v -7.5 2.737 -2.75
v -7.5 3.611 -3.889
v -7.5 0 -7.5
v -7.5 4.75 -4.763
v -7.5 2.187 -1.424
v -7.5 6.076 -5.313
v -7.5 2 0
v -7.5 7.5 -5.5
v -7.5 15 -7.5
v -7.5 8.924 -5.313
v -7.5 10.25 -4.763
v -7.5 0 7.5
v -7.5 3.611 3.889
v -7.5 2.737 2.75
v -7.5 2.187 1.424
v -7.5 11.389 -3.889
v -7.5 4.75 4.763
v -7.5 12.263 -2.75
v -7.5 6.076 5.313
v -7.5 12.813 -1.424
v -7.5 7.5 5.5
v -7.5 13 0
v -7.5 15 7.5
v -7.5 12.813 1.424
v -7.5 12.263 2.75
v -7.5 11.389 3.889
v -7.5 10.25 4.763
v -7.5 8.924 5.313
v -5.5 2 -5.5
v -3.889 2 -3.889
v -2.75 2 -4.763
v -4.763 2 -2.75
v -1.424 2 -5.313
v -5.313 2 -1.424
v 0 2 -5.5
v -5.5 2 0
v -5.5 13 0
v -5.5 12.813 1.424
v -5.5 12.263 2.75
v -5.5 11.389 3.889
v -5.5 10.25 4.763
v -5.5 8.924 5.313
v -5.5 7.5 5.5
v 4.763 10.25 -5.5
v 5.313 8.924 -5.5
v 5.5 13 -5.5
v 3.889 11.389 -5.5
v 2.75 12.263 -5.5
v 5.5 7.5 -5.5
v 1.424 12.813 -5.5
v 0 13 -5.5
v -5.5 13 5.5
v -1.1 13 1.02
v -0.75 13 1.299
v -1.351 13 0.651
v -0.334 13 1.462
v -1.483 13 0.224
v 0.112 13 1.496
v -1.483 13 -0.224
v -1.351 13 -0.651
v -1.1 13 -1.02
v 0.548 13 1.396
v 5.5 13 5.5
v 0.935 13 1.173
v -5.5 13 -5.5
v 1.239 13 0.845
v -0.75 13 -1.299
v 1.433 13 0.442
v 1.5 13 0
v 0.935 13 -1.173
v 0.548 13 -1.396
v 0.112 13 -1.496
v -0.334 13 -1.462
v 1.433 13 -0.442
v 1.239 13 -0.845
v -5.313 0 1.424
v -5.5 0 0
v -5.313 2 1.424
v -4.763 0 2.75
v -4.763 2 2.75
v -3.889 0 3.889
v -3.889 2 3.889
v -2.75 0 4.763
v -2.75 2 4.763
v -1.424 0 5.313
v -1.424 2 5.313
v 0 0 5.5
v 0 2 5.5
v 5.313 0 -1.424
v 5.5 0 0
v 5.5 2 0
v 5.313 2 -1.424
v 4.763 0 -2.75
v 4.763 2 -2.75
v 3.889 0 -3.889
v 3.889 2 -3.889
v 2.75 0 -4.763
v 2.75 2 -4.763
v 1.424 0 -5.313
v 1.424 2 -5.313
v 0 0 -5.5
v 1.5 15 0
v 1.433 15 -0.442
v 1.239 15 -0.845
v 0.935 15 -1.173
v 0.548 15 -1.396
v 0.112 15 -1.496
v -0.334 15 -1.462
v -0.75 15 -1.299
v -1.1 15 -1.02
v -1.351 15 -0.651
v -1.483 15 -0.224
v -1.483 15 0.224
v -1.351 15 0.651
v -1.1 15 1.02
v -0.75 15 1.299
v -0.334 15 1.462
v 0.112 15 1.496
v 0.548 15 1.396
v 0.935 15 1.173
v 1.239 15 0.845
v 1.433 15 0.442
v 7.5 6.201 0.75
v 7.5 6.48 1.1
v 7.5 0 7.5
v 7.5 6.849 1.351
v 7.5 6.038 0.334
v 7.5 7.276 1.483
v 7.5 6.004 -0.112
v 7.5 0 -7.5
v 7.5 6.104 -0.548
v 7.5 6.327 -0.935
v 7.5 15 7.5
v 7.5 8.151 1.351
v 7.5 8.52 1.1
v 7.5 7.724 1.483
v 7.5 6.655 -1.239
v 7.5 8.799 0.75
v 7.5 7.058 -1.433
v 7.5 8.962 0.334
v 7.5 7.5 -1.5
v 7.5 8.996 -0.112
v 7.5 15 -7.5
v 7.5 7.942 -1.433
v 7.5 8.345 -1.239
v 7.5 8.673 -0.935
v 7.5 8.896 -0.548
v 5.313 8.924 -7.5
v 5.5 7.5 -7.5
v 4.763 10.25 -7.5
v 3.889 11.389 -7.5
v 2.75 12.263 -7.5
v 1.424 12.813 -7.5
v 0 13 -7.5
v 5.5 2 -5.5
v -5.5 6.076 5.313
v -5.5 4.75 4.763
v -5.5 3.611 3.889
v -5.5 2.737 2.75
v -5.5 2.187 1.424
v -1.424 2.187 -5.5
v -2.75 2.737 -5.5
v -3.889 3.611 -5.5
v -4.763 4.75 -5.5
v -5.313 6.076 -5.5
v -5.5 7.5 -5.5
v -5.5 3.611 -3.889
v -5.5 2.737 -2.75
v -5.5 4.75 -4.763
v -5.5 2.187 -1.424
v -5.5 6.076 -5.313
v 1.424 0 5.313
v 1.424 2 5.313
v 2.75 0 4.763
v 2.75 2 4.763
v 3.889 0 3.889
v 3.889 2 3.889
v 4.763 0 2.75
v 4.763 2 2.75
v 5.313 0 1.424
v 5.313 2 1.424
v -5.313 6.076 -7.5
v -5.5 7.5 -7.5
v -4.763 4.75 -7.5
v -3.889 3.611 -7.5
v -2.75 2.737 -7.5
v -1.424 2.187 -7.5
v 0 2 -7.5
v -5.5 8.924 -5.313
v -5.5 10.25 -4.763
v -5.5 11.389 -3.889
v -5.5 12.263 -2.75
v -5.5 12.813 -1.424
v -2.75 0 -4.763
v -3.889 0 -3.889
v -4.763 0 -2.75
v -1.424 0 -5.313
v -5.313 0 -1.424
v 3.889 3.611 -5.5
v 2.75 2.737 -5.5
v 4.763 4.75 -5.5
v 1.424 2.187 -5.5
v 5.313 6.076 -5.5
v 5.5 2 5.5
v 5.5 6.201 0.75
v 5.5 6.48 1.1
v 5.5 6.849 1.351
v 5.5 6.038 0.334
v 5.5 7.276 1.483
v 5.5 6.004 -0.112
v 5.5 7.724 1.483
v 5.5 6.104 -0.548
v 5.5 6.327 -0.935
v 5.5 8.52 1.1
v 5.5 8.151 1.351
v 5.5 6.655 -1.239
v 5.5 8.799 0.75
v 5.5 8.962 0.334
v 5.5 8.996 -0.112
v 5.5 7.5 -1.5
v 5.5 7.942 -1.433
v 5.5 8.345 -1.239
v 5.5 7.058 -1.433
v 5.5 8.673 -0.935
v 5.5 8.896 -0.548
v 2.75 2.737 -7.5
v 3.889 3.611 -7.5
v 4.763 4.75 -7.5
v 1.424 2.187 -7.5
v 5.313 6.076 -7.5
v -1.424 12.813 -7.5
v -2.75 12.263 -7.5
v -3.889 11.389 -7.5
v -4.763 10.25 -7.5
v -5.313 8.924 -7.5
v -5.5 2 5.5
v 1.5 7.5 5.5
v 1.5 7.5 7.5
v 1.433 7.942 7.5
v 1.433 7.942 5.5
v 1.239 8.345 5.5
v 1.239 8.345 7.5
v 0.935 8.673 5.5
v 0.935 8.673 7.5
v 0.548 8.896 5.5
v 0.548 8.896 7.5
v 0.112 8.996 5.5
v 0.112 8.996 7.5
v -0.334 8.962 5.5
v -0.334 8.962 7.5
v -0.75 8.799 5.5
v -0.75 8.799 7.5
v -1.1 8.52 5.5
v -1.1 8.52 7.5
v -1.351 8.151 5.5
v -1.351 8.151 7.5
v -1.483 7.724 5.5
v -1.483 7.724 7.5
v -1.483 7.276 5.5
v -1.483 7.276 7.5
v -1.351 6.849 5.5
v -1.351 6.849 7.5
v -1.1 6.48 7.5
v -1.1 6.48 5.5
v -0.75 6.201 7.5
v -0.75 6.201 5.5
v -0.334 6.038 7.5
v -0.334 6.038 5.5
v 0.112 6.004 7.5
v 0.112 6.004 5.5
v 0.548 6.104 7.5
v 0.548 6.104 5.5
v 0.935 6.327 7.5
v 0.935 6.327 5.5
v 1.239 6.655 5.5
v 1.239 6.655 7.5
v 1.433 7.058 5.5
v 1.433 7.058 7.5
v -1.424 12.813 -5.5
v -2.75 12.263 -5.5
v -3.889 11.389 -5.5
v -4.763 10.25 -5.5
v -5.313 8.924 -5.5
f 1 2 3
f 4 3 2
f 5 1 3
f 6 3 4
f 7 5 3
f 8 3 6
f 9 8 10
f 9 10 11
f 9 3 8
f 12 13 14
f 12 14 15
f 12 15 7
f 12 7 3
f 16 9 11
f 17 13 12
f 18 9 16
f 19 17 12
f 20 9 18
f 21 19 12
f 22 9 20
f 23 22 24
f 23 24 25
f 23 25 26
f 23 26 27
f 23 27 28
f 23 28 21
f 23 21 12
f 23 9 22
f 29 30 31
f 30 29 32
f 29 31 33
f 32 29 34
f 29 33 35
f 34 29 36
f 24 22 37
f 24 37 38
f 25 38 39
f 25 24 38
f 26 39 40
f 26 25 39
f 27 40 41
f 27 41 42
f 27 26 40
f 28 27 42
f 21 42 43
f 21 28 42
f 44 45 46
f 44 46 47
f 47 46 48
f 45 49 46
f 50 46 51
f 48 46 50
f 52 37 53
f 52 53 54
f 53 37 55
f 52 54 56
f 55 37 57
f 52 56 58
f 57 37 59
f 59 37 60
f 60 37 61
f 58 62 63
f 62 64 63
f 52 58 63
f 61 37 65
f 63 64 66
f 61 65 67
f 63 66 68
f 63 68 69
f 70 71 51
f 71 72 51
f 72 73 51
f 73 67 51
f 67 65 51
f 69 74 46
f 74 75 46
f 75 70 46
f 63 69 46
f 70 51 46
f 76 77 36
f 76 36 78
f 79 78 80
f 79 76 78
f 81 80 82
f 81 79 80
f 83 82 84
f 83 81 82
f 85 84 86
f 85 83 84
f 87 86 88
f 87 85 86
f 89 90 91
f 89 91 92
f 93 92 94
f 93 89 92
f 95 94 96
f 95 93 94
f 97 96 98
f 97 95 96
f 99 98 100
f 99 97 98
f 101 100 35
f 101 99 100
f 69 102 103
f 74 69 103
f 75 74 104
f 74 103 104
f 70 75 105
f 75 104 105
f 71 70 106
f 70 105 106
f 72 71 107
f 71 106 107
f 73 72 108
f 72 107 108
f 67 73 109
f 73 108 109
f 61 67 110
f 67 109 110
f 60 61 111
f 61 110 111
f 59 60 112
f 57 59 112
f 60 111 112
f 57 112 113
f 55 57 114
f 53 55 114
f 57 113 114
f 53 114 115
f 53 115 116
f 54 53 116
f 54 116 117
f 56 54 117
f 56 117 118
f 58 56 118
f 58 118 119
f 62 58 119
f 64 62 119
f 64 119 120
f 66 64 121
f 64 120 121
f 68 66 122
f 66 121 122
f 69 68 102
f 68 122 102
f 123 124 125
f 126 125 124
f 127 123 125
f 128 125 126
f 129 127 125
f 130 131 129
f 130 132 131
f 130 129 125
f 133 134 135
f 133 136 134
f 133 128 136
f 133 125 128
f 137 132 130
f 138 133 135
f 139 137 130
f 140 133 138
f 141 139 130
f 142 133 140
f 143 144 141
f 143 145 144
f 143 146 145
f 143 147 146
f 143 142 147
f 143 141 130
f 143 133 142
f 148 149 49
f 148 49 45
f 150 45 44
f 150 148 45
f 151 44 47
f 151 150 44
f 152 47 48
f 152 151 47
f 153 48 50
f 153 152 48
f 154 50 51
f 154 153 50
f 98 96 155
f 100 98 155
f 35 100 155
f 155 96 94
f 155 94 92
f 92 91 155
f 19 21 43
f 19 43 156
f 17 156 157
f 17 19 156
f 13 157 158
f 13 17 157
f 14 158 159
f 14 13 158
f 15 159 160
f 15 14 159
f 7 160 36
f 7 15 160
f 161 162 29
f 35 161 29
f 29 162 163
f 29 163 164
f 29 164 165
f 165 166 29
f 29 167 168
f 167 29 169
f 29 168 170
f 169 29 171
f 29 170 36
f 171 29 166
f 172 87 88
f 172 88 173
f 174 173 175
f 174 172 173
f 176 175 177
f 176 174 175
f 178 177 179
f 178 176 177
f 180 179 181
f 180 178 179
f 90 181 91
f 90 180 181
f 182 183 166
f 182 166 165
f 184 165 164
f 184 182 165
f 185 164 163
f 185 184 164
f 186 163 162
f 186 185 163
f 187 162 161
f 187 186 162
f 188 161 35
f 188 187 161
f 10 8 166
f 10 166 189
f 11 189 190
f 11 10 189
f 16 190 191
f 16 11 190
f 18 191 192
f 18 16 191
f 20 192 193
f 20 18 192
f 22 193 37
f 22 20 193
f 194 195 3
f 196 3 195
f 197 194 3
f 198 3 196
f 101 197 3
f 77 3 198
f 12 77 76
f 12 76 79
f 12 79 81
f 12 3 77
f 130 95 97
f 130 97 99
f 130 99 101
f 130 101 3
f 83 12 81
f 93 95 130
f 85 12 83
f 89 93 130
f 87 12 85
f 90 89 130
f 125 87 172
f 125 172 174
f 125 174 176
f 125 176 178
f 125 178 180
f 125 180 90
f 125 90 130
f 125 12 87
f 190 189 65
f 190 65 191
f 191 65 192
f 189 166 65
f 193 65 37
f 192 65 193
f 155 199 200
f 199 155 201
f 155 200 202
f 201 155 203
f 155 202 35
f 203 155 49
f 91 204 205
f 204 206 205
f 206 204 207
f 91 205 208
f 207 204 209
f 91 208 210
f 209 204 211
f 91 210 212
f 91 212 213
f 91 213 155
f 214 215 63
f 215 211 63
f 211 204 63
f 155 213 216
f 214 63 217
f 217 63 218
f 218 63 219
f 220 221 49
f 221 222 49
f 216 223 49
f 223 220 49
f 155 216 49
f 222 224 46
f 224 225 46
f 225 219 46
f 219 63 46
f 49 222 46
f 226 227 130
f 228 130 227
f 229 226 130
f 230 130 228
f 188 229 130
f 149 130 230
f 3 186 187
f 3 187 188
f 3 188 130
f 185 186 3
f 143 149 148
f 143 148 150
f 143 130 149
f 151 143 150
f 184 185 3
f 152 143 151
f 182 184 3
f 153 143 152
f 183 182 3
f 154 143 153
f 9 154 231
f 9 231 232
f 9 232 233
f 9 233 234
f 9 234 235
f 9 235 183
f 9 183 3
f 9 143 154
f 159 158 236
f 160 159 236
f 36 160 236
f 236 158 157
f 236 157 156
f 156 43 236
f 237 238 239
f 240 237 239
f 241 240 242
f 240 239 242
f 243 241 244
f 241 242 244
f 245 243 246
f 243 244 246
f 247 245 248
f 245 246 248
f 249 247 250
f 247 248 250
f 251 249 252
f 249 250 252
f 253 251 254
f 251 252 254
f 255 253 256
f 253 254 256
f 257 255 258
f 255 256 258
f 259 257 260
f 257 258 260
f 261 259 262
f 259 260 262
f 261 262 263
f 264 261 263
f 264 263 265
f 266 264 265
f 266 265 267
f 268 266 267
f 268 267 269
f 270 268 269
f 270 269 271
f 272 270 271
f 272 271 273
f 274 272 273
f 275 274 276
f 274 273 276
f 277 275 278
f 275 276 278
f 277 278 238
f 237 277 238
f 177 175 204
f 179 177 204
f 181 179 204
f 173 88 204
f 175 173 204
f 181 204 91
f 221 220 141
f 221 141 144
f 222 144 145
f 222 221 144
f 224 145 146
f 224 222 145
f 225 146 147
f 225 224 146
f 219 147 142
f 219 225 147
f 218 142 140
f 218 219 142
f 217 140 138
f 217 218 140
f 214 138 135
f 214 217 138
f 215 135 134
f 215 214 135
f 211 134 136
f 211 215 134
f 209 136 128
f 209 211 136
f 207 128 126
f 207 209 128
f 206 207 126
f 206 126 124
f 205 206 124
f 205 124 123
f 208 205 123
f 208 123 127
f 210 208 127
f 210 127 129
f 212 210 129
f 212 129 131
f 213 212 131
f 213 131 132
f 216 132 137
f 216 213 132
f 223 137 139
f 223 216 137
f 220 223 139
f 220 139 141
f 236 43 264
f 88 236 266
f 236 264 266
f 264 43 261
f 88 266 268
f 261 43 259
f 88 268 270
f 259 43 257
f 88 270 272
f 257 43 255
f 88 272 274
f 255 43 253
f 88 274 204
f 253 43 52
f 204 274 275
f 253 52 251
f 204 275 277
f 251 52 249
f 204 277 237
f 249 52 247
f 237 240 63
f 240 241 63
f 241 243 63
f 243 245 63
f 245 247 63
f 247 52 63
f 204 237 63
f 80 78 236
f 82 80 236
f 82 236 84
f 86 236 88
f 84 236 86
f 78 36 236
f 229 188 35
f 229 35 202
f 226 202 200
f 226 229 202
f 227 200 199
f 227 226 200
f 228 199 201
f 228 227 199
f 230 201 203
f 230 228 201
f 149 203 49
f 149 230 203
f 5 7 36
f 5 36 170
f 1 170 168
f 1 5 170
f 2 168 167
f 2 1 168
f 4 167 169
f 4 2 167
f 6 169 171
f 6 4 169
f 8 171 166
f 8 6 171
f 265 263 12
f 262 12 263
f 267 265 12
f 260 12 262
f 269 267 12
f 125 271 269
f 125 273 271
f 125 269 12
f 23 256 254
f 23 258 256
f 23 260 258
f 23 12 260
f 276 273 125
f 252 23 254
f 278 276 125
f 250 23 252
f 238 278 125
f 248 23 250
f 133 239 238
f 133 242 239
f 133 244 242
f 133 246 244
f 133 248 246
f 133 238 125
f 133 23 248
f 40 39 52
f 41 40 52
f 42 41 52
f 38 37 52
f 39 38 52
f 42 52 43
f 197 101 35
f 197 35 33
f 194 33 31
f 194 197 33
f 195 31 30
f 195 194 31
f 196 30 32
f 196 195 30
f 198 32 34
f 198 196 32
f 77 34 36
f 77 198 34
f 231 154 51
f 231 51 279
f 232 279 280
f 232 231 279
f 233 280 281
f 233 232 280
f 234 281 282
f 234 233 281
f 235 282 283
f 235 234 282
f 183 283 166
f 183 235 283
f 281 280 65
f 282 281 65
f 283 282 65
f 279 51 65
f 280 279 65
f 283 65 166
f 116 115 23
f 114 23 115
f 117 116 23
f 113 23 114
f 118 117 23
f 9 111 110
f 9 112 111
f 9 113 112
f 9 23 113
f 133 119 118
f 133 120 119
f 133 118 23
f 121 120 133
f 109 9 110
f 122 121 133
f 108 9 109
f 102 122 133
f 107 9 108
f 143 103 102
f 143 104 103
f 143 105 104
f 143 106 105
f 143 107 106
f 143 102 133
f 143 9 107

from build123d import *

# Parameters (mm, degrees)
SKETCH1_W           = 15
SKETCH1_H           = 15
SKETCH1_W_2         = 11
SKETCH1_H_2         = 11
BOSS_EXTRUDE1_DEPTH = 2
SKETCH5_W           = 2
SKETCH5_H           = 2
BOSS_EXTRUDE2_DEPTH = 11
SKETCH8_W           = 15
SKETCH8_H           = 15
SKETCH8_W_2         = 11
SKETCH8_H_2         = 11
BOSS_EXTRUDE3_DEPTH = 2
BOSS_EXTRUDE4_DEPTH = 2
BOSS_EXTRUDE5_DEPTH = 2
BOSS_EXTRUDE6_DEPTH = 2
SKETCH12_W          = 11
SKETCH12_H          = 11
SKETCH12_R          = 1.5
BOSS_EXTRUDE7_DEPTH = 2
SKETCH13_W          = 11
SKETCH13_H          = 11
SKETCH13_R          = 1.5
BOSS_EXTRUDE8_DEPTH = 2
BOSS_EXTRUDE9_START = -2
SKETCH14_W          = 11
SKETCH14_H          = 11
SKETCH14_R          = 1.5
BOSS_EXTRUDE9_DEPTH = 2


with BuildPart() as part:
    # Sketch1 → Boss-Extrude1 (new body)
    with BuildSketch(Plane(origin=(0, 0, 0), x_dir=(1, 0, 0), z_dir=(0, 1, 0))):
        Rectangle(SKETCH1_W, SKETCH1_H)
        Rectangle(SKETCH1_W_2, SKETCH1_H_2, mode=Mode.SUBTRACT)
    extrude(amount=BOSS_EXTRUDE1_DEPTH)

    # Sketch5 → Boss-Extrude2 (add)
    with BuildSketch(Plane(origin=(0, 2, 0), x_dir=(1, 0, 0), z_dir=(0, 1, 0))):
        with Locations((-6.5, -6.5)):
            Rectangle(SKETCH5_W, SKETCH5_H)
        with Locations((6.5, -6.5)):
            Rectangle(SKETCH5_W, SKETCH5_H)
        with Locations((6.5, 6.5)):
            Rectangle(SKETCH5_W, SKETCH5_H)
        with Locations((-6.5, 6.5)):
            Rectangle(SKETCH5_W, SKETCH5_H)
    extrude(amount=BOSS_EXTRUDE2_DEPTH)

    # Sketch8 → Boss-Extrude3 (add)
    with BuildSketch(Plane(origin=(0, 13, 0), x_dir=(1, 0, 0), z_dir=(0, 1, 0))):
        Rectangle(SKETCH8_W, SKETCH8_H)
        Rectangle(SKETCH8_W_2, SKETCH8_H_2, mode=Mode.SUBTRACT)
    extrude(amount=BOSS_EXTRUDE3_DEPTH)

    # Sketch9 → Boss-Extrude4 (add)
    with BuildSketch(Plane.XZ):
        with BuildLine():
            Line((5.5, 0), (5.5, 5.5))
            Line((5.5, 5.5), (-2e-08, 5.5))
            ThreePointArc((-2e-08, 5.5), (3.88908729, 3.889087304), (5.5, 0))
        make_face()
        with BuildLine():
            ThreePointArc((-5.5, 1.5e-08), (-3.889087298, 3.889087295), (-2e-08, 5.5))
            Line((-2e-08, 5.5), (-5.5, 5.5))
            Line((-5.5, 5.5), (-5.5, 1.5e-08))
        make_face()
        with BuildLine():
            Line((5.5, -5.5), (5.5, 0))
            ThreePointArc((5.5, 0), (3.889087294, -3.889087299), (-7e-09, -5.5))
            Line((-7e-09, -5.5), (5.5, -5.5))
        make_face()
        with BuildLine():
            ThreePointArc((-7e-09, -5.5), (-3.889087305, -3.889087288), (-5.5, 1.5e-08))
            Line((-5.5, 1.5e-08), (-5.5, -5.5))
            Line((-5.5, -5.5), (-7e-09, -5.5))
        make_face()
    extrude(amount=-BOSS_EXTRUDE4_DEPTH)

    # Sketch10 → Boss-Extrude5 (add)
    with BuildSketch(Plane(origin=(0, 0, -7.5), x_dir=(-1, 0, 0), z_dir=(0, 0, -1))):
        with BuildLine():
            Line((-5.5, 13), (-5.5, 7.500000001))
            ThreePointArc((-5.5, 7.500000001), (-3.889087296, 11.389087297), (0, 13))
            Line((0, 13), (-5.5, 13))
        make_face()
        with BuildLine():
            ThreePointArc((0, 13), (3.889087297, 11.389087297), (5.5, 7.5))
            Line((5.5, 7.5), (5.5, 13))
            Line((5.5, 13), (0, 13))
        make_face()
        with BuildLine():
            ThreePointArc((5.5, 7.5), (3.889087297, 3.610912703), (0, 2))
            Line((0, 2), (5.5, 2))
            Line((5.5, 2), (5.5, 7.5))
        make_face()
        with BuildLine():
            Line((-5.5, 7.500000001), (-5.5, 2))
            Line((-5.5, 2), (0, 2))
            ThreePointArc((0, 2), (-3.889087297, 3.610912704), (-5.5, 7.500000001))
        make_face()
    extrude(amount=-BOSS_EXTRUDE5_DEPTH)

    # Sketch11 → Boss-Extrude6 (add)
    with BuildSketch(Plane.ZY.offset(7.5)):
        with BuildLine():
            Line((-5.5, 13), (-5.5, 7.5))
            ThreePointArc((-5.5, 7.5), (-3.88908729, 11.389087303), (1.9e-08, 13))
            Line((1.9e-08, 13), (-5.5, 13))
        make_face()
        with BuildLine():
            ThreePointArc((1.9e-08, 13), (3.889087303, 11.38908729), (5.5, 7.5))
            Line((5.5, 7.5), (5.5, 13))
            Line((5.5, 13), (1.9e-08, 13))
        make_face()
        with BuildLine():
            Line((-5.5, 7.5), (-5.5, 2))
            Line((-5.5, 2), (-7e-09, 2))
            ThreePointArc((-7e-09, 2), (-3.889087299, 3.610912706), (-5.5, 7.5))
        make_face()
        with BuildLine():
            ThreePointArc((5.5, 7.5), (3.889087294, 3.610912701), (-7e-09, 2))
            Line((-7e-09, 2), (5.5, 2))
            Line((5.5, 2), (5.5, 7.5))
        make_face()
    extrude(amount=-BOSS_EXTRUDE6_DEPTH)

    # Sketch12 → Boss-Extrude7 (add)
    with BuildSketch(Plane.XY.offset(7.5)):
        with Locations((0, 7.5)):
            Rectangle(SKETCH12_W, SKETCH12_H)
        with Locations((0, 7.5)):
            Circle(SKETCH12_R, mode=Mode.SUBTRACT)
    extrude(amount=-BOSS_EXTRUDE7_DEPTH)

    # Sketch13 → Boss-Extrude8 (add)
    with BuildSketch(Plane(origin=(0, 15, 0), x_dir=(1, 0, 0), z_dir=(0, 1, 0))):
        Rectangle(SKETCH13_W, SKETCH13_H)
        Circle(SKETCH13_R, mode=Mode.SUBTRACT)
    extrude(amount=-BOSS_EXTRUDE8_DEPTH)

    # Sketch14 → Boss-Extrude9 (add)
    with BuildSketch(Plane(origin=(7.5, 0, 0), x_dir=(0, 0, -1), z_dir=(1, 0, 0)).offset(BOSS_EXTRUDE9_START)):
        with Locations((0, 7.5)):
            Rectangle(SKETCH14_W, SKETCH14_H)
        with Locations((0, 7.5)):
            Circle(SKETCH14_R, mode=Mode.SUBTRACT)
    extrude(amount=BOSS_EXTRUDE9_DEPTH)


solid = part.part
